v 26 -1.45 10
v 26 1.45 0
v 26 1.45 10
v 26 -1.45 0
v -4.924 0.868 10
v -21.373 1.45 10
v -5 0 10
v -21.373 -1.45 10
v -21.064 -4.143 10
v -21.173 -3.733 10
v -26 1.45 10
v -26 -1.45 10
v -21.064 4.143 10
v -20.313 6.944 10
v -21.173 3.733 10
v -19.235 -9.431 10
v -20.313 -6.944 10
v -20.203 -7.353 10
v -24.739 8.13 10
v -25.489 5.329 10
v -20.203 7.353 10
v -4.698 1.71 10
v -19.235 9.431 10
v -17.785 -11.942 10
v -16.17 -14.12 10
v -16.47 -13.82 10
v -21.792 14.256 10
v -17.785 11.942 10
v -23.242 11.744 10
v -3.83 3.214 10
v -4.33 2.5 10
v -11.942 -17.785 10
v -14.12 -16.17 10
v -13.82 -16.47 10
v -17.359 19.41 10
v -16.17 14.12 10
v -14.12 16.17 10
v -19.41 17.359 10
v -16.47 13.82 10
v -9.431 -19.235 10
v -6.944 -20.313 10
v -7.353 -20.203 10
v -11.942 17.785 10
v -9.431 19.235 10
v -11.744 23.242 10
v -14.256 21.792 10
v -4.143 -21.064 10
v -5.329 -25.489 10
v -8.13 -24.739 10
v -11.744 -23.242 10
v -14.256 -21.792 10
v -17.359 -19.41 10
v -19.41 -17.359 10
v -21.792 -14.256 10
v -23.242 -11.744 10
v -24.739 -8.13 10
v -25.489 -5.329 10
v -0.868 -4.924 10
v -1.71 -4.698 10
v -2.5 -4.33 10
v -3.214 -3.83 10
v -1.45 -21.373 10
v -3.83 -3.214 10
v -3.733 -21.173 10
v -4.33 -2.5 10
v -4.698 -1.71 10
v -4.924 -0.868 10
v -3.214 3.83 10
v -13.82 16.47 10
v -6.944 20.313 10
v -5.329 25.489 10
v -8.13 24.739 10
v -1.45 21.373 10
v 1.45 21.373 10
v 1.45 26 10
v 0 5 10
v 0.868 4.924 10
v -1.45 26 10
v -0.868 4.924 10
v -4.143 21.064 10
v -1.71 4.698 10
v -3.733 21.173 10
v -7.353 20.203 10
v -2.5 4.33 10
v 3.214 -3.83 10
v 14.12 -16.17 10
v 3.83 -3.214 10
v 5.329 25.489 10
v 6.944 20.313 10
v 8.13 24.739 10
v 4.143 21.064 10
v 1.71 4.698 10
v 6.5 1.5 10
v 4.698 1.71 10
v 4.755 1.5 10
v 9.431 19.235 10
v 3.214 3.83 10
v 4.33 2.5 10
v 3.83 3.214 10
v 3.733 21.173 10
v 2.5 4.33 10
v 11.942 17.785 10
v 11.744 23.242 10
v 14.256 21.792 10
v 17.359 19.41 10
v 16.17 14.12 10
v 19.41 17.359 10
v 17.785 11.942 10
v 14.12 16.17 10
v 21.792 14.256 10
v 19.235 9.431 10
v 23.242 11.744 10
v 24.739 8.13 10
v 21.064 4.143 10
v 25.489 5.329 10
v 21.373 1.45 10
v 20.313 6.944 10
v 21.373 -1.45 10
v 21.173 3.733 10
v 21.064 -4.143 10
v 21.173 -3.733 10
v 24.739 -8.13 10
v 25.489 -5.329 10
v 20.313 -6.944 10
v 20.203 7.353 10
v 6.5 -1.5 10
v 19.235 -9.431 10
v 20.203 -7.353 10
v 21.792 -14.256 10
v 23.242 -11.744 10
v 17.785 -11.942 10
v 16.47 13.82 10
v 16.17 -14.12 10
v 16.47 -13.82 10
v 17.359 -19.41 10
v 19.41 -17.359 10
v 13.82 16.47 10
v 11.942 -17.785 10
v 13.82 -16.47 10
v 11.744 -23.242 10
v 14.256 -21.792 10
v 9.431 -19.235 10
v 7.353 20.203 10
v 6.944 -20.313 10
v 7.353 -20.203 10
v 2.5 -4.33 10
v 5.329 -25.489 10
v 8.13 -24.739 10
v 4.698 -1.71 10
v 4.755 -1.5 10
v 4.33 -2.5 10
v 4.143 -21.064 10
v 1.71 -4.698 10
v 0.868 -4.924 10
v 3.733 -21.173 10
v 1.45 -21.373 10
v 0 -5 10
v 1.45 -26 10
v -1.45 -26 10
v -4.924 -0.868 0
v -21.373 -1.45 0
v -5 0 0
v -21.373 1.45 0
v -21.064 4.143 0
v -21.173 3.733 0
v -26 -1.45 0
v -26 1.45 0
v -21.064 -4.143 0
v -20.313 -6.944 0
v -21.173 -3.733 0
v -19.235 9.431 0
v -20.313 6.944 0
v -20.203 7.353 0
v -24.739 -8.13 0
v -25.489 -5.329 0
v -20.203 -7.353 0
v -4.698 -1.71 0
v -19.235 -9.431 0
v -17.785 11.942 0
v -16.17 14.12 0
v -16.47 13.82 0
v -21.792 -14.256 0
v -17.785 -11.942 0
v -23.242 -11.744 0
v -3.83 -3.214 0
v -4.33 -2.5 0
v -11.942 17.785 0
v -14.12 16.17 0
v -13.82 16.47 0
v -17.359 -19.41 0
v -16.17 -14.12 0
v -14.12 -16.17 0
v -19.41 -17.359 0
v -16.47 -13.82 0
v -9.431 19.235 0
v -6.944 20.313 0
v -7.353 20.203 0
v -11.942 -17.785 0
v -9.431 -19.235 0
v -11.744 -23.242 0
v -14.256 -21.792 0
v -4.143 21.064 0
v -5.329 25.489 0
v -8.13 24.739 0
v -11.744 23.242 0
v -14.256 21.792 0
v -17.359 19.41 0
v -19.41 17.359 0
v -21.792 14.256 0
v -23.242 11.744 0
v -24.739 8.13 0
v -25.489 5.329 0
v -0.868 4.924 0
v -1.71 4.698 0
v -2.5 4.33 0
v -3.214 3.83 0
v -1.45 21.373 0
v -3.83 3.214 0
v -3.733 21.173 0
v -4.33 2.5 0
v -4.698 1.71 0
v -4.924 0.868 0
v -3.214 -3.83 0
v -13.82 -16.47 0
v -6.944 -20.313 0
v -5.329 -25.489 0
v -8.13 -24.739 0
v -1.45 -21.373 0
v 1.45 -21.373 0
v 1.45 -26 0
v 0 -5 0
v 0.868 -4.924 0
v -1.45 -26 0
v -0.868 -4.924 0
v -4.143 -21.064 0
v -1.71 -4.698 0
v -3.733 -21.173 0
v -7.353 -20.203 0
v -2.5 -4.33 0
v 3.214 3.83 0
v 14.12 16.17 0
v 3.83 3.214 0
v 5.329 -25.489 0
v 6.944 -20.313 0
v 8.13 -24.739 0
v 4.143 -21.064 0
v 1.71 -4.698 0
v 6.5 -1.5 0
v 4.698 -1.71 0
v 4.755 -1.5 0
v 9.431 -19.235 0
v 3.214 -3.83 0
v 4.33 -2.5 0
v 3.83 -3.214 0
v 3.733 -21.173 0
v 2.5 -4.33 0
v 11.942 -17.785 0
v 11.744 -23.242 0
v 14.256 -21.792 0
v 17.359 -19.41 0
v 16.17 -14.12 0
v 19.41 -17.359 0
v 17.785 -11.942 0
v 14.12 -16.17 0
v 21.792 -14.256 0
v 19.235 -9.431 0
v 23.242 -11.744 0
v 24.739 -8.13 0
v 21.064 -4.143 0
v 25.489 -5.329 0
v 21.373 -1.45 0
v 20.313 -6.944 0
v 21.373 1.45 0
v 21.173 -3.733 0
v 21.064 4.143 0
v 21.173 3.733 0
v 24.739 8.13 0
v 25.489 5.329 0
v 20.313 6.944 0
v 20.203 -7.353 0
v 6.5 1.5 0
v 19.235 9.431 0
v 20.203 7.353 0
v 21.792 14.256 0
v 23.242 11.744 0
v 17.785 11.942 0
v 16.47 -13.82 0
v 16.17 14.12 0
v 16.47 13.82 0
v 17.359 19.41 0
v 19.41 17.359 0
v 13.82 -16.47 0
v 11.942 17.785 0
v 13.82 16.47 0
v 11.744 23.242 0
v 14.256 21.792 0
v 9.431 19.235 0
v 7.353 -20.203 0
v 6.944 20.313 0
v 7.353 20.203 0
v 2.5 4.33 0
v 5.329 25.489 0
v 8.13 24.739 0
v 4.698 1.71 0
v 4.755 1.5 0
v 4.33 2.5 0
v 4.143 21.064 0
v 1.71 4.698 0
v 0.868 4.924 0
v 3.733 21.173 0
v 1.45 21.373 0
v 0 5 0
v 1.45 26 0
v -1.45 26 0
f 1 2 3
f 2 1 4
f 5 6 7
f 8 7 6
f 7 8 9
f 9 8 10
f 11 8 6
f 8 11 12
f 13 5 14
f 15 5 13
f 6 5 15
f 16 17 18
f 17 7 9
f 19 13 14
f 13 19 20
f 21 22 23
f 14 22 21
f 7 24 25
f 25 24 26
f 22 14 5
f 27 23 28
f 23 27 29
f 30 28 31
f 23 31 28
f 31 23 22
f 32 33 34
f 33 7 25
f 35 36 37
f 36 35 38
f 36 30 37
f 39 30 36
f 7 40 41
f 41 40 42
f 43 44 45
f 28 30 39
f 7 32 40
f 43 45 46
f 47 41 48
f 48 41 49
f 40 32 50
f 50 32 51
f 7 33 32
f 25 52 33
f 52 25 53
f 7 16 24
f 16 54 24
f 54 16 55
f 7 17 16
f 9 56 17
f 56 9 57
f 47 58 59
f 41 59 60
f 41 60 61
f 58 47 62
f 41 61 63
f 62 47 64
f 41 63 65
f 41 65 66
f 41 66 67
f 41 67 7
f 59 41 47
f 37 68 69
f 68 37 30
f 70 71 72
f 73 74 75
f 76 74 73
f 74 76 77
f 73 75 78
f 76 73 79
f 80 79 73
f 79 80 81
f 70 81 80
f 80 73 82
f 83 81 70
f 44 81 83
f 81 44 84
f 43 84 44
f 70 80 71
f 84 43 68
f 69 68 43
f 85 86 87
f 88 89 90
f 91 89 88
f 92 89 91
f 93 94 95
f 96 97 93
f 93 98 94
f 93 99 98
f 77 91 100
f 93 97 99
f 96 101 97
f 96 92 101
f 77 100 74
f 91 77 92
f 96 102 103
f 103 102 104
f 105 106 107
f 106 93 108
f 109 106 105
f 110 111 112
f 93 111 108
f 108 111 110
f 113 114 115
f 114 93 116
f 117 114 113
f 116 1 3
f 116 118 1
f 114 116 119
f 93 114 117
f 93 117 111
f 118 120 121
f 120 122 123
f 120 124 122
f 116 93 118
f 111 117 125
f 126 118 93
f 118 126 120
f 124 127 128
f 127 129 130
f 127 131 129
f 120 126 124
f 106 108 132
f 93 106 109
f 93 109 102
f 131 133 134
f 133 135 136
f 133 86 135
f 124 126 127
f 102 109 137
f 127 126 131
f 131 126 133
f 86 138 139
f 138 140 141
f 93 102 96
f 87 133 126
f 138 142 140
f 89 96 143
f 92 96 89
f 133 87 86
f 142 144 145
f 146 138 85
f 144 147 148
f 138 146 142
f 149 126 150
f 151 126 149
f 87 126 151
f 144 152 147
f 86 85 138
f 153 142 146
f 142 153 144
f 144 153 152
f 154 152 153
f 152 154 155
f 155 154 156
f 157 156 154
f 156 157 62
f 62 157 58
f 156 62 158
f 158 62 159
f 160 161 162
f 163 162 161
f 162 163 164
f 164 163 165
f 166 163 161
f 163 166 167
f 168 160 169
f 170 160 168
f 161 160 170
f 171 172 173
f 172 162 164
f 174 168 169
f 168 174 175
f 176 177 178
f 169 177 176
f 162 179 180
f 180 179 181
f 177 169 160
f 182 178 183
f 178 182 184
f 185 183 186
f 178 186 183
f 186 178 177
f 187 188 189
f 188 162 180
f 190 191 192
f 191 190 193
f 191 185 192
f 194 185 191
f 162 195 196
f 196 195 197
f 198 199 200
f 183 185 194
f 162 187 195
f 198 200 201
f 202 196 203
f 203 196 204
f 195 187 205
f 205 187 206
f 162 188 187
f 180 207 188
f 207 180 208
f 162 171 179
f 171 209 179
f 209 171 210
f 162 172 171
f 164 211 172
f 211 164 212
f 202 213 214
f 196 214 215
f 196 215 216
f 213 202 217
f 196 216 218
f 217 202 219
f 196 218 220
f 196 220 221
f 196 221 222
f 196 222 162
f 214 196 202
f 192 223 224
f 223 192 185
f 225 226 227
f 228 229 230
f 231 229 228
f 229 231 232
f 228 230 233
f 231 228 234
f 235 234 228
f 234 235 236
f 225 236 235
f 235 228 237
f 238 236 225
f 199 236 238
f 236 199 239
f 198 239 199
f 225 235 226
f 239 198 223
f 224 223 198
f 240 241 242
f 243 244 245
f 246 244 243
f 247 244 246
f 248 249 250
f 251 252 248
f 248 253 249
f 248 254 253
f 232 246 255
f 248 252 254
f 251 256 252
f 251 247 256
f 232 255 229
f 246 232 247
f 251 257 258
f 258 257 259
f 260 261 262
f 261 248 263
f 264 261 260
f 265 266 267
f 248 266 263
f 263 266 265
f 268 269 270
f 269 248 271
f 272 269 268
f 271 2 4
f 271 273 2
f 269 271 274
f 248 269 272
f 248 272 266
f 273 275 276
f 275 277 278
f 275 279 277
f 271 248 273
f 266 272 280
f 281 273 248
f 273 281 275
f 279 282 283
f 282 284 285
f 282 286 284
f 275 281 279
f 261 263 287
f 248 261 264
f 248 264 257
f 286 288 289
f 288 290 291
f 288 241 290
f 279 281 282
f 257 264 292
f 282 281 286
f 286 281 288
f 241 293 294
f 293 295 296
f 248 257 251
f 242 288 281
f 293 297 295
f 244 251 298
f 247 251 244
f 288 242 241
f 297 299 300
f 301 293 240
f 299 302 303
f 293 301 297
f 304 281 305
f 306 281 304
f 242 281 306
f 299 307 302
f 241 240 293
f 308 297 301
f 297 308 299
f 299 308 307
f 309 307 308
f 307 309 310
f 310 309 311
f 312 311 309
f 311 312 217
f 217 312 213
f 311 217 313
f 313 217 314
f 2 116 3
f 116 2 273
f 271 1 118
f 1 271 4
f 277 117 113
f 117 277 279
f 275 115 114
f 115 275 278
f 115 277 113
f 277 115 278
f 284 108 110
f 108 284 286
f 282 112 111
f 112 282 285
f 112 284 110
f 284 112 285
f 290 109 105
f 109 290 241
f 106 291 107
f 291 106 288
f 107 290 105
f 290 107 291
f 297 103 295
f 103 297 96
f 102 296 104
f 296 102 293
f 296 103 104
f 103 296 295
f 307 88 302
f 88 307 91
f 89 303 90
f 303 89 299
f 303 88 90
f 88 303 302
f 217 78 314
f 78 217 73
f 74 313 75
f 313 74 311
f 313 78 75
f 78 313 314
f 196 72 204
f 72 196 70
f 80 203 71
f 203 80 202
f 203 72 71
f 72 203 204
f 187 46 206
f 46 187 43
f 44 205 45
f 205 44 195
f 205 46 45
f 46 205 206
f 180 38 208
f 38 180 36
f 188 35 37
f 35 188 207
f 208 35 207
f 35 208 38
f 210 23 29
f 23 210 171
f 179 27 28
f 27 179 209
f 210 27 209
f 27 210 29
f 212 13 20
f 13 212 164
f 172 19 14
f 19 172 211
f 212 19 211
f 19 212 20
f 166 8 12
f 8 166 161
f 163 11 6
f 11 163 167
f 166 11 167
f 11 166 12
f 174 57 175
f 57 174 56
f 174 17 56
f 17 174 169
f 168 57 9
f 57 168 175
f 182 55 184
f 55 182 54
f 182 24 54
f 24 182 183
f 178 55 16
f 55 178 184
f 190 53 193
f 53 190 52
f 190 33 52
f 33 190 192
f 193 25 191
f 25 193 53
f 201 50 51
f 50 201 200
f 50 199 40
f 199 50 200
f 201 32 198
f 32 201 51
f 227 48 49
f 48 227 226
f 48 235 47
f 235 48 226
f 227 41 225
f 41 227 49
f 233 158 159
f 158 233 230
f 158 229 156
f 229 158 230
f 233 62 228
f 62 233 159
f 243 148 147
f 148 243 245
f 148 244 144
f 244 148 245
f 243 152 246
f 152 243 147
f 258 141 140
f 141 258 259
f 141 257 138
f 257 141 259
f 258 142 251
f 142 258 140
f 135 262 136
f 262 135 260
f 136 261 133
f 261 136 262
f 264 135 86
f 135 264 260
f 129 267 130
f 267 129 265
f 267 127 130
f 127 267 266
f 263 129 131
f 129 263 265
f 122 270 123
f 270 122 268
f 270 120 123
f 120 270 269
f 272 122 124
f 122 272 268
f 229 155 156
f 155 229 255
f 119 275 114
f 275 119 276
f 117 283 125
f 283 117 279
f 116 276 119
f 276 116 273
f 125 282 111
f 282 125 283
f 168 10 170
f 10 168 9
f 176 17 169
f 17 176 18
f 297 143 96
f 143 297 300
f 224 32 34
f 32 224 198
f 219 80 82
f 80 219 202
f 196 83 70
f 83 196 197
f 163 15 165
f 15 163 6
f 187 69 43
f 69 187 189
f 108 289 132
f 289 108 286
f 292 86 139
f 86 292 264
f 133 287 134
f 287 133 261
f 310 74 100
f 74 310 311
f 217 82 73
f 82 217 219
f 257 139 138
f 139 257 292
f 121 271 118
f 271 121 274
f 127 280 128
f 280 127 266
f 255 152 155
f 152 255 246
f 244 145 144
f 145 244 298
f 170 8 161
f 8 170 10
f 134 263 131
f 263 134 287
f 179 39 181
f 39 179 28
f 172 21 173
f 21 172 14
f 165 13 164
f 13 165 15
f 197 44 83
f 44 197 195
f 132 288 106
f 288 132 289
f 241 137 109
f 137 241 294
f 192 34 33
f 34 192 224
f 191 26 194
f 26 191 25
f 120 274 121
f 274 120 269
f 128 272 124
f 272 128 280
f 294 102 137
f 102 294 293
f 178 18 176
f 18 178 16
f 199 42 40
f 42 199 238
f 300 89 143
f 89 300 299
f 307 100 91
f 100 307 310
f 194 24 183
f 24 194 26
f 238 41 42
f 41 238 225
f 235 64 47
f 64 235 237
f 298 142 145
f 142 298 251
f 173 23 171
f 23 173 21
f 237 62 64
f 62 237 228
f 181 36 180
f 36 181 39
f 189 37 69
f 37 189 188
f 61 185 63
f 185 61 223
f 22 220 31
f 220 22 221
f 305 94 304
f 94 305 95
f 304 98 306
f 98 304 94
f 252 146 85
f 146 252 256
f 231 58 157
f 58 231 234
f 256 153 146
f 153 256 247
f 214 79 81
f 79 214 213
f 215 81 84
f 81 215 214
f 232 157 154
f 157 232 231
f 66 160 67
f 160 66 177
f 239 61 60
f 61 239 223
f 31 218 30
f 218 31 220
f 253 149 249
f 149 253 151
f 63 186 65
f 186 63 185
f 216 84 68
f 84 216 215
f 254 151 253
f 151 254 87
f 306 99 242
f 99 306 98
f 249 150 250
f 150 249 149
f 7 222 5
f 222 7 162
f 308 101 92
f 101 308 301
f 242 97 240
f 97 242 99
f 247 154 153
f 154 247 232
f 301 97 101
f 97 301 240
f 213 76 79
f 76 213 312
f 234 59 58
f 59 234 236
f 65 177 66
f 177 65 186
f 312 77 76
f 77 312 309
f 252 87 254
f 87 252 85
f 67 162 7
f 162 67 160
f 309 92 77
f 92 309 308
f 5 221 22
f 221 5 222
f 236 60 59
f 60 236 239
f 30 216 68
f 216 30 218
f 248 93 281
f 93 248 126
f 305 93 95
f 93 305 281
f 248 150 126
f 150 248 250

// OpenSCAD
// Parametric Metric Spur Gear Generator (mm)
$fn = 36;

module_m = 2.0;
teeth = 24;
face_width = 10.0;
bore_dia = 10.0;
keyway_w = 3.0;
keyway_d = 1.5;

function pitch_radius(m, z) = (m * z) / 2.0;
function root_radius(m, z) = pitch_radius(m, z) - 1.25 * m;

module spur_gear(m = 2.0, z = 24, width = 10.0, bore = 10.0) {
  r_pitch = pitch_radius(m, z);
  r_root = root_radius(m, z);
  tooth_h = 2.25 * m;
  tooth_w = 1.45 * m;

  difference() {
    union() {
      cylinder(r = r_root, h = width);
      for (i = [0 : z - 1]) {
        rotate([0, 0, i * 360 / z])
          translate([r_root - 0.3, -tooth_w / 2, 0])
            cube([tooth_h + 0.3, tooth_w, width]);
      }
    }
    translate([0, 0, -1])
      cylinder(r = bore / 2, h = width + 2);
    translate([bore / 2 - 0.5, -keyway_w / 2, -1])
      cube([keyway_d + 0.5, keyway_w, width + 2]);
  }
}

spur_gear(m = module_m, z = teeth, width = face_width, bore = bore_dia);
